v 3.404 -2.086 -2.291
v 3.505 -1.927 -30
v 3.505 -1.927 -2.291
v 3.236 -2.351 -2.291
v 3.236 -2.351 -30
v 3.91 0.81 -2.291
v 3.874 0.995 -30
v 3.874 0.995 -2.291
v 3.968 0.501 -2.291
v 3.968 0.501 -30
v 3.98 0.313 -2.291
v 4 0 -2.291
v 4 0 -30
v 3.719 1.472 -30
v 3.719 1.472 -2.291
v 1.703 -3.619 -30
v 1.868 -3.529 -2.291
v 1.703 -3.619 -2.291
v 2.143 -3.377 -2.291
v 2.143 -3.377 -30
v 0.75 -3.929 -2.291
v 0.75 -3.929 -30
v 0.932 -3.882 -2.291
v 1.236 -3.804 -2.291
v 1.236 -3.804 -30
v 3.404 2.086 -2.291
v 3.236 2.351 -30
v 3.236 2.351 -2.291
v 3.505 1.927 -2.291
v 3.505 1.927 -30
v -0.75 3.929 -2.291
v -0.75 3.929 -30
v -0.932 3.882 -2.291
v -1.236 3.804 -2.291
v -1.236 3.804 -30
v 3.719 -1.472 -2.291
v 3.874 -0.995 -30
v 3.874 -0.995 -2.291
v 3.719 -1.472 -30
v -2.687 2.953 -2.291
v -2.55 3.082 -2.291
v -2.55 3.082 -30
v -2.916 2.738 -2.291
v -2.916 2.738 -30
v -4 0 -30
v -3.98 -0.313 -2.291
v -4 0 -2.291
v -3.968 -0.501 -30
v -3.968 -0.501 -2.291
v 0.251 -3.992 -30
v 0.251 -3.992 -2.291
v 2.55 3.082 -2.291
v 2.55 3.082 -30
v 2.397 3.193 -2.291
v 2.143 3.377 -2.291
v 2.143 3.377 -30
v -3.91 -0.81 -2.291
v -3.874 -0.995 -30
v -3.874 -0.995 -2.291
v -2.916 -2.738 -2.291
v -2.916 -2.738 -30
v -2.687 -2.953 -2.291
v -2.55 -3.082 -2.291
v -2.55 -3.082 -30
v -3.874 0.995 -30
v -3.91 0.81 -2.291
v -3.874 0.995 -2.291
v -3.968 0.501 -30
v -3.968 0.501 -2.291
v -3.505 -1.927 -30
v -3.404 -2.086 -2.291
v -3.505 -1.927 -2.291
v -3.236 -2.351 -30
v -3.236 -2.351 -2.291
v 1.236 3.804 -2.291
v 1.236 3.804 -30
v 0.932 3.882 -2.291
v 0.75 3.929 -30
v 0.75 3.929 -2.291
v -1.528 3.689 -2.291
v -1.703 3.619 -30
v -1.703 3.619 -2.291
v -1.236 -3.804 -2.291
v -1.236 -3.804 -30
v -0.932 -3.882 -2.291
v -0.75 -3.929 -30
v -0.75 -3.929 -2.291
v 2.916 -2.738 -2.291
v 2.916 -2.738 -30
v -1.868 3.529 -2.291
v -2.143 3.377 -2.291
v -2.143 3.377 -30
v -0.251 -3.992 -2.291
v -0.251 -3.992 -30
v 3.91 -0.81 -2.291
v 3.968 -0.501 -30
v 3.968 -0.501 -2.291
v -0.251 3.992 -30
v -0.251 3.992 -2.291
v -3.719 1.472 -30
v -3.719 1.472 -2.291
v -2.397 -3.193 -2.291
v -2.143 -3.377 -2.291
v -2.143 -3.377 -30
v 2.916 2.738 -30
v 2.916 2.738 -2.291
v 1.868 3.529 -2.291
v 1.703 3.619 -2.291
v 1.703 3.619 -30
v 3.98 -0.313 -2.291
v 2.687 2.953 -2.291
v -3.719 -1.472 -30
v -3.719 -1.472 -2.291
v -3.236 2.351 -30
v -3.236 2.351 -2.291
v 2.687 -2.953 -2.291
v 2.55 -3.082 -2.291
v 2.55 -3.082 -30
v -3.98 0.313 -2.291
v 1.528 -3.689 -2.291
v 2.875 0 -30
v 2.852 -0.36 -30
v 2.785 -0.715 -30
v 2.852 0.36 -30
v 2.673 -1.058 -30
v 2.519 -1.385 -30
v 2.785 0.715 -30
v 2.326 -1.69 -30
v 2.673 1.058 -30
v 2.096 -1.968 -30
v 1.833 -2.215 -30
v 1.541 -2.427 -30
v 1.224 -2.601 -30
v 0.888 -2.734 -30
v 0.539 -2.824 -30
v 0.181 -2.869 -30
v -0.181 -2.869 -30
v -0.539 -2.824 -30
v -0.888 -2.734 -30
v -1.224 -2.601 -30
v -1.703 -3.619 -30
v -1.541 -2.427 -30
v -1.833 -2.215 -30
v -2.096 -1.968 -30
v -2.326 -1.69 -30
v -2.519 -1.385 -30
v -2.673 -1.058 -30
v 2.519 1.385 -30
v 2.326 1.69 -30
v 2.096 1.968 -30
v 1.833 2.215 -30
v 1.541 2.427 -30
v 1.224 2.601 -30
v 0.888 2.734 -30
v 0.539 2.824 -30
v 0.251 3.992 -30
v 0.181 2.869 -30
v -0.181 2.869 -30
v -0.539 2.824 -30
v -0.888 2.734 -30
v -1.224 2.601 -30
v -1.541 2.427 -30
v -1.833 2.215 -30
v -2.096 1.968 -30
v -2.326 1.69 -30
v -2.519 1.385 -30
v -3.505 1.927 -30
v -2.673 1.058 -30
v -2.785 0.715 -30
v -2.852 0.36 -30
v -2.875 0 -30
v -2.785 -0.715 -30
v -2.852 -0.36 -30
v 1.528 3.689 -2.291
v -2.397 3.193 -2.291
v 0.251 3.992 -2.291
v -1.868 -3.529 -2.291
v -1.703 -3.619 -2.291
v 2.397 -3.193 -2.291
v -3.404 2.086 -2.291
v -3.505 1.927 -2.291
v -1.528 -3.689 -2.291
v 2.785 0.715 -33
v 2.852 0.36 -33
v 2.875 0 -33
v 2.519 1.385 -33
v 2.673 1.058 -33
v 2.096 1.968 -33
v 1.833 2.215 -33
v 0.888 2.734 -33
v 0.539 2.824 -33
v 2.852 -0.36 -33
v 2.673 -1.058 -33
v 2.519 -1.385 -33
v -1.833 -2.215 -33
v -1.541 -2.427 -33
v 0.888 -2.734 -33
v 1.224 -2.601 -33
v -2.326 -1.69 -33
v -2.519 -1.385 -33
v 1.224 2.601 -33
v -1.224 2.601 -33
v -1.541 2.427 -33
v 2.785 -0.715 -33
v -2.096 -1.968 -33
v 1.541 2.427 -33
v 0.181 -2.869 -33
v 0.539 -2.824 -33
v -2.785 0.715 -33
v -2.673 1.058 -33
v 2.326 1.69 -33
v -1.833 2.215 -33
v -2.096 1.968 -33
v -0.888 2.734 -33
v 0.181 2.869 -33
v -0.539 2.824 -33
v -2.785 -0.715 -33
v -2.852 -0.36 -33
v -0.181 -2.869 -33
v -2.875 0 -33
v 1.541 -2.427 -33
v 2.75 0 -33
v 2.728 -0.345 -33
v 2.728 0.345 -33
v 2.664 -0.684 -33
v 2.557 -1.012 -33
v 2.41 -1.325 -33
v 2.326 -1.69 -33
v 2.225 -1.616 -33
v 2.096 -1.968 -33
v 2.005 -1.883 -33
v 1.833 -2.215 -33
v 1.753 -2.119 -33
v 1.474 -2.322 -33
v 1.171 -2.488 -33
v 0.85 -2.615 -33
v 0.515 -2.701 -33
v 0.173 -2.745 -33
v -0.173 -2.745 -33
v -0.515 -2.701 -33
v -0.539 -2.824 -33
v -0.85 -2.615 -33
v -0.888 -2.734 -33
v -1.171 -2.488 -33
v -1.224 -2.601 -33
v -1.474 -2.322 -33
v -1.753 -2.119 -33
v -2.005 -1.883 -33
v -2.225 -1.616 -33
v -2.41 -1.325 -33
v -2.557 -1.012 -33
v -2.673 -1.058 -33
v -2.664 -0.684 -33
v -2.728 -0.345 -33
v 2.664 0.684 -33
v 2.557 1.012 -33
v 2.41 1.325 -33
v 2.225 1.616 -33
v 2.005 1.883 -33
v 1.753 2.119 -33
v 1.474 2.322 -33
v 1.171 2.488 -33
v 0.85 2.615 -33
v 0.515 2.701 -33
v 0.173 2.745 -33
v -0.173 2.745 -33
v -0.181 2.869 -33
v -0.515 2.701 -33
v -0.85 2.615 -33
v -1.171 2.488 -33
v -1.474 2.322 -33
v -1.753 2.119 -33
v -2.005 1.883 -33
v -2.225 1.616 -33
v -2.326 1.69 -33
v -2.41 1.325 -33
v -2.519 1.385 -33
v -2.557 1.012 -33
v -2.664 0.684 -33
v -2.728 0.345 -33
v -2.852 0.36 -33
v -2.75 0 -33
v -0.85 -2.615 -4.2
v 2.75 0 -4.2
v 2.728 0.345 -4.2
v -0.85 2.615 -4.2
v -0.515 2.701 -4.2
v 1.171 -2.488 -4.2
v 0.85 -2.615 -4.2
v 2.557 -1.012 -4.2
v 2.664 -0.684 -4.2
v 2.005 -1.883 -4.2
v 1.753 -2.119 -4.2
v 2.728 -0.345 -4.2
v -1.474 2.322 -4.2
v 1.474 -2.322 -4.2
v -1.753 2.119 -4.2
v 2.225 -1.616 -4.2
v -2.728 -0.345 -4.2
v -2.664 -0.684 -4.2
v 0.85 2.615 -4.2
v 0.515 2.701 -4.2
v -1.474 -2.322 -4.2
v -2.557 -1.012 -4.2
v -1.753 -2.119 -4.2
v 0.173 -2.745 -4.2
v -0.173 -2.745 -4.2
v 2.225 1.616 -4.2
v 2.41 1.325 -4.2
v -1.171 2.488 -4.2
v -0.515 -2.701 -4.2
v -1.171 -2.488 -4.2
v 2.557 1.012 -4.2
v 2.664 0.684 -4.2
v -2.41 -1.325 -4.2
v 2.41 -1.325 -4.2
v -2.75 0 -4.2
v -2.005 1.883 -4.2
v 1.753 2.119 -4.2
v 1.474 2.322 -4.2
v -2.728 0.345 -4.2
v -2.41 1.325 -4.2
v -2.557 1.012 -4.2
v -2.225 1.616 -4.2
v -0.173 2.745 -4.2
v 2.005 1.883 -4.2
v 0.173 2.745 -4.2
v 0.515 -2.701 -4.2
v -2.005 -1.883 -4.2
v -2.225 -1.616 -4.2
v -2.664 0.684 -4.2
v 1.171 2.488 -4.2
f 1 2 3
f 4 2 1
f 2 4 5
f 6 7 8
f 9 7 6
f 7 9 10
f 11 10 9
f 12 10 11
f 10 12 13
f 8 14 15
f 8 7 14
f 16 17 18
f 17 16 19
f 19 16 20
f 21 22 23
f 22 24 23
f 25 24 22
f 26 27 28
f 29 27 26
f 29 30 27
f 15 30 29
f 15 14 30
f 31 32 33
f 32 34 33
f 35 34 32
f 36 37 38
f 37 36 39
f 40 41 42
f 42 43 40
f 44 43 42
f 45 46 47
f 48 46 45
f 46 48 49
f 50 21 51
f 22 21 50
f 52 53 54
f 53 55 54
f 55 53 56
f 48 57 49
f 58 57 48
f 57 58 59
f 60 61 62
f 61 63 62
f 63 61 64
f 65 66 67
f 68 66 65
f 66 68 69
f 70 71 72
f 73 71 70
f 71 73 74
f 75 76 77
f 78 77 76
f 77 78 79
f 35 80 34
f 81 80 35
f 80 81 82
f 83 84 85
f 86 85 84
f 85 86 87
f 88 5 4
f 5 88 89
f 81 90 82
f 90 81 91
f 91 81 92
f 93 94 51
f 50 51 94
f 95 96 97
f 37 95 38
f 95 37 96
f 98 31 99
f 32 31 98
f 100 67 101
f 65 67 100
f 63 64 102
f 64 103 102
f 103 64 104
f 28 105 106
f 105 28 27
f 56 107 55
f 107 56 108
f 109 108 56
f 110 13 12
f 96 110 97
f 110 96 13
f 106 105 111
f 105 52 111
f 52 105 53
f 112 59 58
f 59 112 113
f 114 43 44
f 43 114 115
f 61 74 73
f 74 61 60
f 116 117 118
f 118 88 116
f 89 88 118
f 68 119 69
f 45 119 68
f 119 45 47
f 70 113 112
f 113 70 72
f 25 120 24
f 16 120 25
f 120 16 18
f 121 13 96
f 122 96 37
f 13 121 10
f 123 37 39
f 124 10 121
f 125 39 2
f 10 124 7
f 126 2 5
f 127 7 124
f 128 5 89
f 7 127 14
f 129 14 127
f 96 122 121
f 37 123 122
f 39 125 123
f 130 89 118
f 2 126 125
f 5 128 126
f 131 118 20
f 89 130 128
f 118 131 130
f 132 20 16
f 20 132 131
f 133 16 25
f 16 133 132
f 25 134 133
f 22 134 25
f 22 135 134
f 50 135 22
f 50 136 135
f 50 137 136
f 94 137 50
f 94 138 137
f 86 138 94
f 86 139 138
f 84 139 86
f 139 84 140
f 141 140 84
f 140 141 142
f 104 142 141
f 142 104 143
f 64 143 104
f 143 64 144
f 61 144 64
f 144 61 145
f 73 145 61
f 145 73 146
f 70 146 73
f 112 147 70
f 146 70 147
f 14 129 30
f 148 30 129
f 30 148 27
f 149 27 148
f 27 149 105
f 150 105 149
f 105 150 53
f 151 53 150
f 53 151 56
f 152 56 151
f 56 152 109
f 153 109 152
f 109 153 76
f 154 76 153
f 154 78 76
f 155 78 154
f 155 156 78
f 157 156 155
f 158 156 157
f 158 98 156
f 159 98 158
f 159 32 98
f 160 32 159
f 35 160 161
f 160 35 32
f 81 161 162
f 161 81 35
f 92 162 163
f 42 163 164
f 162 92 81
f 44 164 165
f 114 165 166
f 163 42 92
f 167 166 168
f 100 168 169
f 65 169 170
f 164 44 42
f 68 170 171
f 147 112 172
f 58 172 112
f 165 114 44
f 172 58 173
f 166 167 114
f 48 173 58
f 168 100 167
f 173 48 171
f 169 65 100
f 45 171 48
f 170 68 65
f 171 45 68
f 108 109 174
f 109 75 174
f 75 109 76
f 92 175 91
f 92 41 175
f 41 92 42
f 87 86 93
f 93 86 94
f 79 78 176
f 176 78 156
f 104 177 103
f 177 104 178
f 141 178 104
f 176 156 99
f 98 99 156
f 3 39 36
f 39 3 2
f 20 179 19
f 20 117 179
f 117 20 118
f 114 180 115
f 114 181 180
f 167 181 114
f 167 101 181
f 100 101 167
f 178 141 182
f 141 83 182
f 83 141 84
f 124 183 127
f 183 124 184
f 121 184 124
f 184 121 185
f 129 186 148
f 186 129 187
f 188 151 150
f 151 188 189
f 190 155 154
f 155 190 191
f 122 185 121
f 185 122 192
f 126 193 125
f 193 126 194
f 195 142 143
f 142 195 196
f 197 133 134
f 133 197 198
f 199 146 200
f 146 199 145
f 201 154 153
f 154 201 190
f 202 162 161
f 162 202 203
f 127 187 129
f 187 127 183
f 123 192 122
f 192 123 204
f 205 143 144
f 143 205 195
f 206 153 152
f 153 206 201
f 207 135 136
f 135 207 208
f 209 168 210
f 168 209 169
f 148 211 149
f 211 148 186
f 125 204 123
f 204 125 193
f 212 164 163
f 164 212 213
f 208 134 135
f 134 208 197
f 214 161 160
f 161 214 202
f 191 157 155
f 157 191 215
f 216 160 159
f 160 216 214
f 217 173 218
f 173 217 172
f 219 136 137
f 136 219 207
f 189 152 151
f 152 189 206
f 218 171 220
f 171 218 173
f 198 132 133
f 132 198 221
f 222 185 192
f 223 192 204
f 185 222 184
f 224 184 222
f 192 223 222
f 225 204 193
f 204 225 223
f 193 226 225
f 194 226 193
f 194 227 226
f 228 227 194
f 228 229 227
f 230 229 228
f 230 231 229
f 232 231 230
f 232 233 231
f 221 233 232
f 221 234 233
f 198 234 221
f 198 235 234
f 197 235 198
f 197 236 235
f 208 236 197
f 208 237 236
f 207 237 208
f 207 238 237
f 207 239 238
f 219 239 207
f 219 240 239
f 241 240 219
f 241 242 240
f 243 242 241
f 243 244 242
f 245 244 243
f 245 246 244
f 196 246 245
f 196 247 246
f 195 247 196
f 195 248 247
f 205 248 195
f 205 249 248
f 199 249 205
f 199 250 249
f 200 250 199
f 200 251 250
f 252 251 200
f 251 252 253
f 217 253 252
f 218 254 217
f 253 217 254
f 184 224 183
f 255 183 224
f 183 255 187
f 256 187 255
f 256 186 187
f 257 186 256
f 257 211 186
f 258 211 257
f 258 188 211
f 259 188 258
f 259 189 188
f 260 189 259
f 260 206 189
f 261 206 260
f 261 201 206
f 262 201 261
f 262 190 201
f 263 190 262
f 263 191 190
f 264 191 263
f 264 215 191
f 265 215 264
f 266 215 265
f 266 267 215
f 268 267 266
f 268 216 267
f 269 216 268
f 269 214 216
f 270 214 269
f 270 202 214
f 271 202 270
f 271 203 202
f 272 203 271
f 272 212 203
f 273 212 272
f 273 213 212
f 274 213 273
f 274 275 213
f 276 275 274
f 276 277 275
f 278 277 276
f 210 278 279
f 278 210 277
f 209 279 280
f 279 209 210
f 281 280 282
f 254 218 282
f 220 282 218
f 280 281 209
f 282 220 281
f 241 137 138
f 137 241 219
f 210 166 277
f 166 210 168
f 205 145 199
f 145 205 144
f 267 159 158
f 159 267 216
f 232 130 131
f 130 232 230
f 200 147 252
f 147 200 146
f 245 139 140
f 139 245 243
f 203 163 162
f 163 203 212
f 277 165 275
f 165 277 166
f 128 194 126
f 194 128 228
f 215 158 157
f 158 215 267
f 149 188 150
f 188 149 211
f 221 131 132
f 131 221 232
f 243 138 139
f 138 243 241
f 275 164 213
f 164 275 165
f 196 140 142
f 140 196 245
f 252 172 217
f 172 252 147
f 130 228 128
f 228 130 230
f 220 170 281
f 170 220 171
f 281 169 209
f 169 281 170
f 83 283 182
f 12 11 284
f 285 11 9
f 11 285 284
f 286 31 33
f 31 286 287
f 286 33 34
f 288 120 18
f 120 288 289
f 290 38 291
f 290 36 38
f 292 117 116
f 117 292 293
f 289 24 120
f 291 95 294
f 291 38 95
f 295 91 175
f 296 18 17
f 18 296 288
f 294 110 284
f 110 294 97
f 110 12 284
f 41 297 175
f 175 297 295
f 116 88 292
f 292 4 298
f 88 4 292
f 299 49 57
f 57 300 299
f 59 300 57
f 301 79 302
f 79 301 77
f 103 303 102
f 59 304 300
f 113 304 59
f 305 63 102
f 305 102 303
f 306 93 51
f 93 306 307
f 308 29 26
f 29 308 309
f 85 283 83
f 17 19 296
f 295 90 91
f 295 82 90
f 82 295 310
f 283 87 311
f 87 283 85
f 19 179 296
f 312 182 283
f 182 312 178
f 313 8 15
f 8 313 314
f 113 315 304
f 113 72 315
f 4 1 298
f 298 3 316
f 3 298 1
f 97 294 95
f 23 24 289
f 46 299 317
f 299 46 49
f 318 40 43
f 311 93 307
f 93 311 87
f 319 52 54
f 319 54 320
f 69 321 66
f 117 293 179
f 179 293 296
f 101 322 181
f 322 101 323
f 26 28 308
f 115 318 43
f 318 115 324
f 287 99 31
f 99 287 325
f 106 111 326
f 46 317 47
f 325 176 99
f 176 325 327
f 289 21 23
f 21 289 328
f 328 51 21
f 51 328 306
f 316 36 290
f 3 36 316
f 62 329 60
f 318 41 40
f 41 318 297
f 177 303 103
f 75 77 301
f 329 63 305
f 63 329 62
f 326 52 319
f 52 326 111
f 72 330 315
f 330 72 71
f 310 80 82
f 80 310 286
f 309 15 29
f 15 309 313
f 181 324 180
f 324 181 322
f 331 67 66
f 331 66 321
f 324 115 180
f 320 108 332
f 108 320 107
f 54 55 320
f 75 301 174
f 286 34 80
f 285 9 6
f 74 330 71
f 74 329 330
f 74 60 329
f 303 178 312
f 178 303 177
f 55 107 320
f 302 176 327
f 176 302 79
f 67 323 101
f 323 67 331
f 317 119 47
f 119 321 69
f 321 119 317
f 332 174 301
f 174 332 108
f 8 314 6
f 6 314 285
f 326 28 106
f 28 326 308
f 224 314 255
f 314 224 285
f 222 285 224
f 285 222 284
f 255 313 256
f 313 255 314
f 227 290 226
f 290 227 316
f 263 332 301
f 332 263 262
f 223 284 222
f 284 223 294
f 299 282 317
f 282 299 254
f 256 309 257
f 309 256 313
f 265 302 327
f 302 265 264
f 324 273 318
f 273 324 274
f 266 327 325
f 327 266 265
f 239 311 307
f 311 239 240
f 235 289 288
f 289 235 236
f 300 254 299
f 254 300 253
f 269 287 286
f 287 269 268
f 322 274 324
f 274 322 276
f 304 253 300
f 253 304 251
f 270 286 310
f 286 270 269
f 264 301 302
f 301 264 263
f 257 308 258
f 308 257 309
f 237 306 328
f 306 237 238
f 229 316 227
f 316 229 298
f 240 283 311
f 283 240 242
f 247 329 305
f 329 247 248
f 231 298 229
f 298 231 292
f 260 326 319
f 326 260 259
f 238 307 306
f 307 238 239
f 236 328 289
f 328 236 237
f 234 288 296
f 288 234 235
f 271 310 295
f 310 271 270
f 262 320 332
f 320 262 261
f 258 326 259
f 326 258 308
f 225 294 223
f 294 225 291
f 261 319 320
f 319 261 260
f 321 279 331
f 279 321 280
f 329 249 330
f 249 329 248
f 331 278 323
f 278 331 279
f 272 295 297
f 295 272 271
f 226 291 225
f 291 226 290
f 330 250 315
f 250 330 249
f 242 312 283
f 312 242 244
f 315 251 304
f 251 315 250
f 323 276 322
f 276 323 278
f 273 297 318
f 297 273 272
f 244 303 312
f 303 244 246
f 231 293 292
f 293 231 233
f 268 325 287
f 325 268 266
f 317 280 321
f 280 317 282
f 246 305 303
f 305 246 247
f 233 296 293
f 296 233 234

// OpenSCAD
$fn = 50;

difference() {
	union() {
		translate(v = [0, 0, -30.0]) {
			cylinder(h = 33, r = 4.0);
		}
		#translate(v = [0, 0, -33.0]) {
			cylinder(h = 33, r = 2.875);
		}
	}
	union() {
		translate(v = [0, 0, 0]) {
			rotate(a = [0, 0, 0]) {
				difference() {
					union() {
						translate(v = [0, 0, -33.0]) {
							cylinder(h = 33, r = 2.25);
						}
						translate(v = [0, 0, -4.2]) {
							cylinder(h = 4.2, r1 = 2.75, r2 = 5.5);
						}
						translate(v = [0, 0, -33.0]) {
							cylinder(h = 33, r = 2.75);
						}
						translate(v = [0, 0, -33.0]) {
							cylinder(h = 33, r = 2.25);
						}
					}
					union();
				}
			}
		}
		#cylinder(h = 3, r = 6.25);
	}
}
